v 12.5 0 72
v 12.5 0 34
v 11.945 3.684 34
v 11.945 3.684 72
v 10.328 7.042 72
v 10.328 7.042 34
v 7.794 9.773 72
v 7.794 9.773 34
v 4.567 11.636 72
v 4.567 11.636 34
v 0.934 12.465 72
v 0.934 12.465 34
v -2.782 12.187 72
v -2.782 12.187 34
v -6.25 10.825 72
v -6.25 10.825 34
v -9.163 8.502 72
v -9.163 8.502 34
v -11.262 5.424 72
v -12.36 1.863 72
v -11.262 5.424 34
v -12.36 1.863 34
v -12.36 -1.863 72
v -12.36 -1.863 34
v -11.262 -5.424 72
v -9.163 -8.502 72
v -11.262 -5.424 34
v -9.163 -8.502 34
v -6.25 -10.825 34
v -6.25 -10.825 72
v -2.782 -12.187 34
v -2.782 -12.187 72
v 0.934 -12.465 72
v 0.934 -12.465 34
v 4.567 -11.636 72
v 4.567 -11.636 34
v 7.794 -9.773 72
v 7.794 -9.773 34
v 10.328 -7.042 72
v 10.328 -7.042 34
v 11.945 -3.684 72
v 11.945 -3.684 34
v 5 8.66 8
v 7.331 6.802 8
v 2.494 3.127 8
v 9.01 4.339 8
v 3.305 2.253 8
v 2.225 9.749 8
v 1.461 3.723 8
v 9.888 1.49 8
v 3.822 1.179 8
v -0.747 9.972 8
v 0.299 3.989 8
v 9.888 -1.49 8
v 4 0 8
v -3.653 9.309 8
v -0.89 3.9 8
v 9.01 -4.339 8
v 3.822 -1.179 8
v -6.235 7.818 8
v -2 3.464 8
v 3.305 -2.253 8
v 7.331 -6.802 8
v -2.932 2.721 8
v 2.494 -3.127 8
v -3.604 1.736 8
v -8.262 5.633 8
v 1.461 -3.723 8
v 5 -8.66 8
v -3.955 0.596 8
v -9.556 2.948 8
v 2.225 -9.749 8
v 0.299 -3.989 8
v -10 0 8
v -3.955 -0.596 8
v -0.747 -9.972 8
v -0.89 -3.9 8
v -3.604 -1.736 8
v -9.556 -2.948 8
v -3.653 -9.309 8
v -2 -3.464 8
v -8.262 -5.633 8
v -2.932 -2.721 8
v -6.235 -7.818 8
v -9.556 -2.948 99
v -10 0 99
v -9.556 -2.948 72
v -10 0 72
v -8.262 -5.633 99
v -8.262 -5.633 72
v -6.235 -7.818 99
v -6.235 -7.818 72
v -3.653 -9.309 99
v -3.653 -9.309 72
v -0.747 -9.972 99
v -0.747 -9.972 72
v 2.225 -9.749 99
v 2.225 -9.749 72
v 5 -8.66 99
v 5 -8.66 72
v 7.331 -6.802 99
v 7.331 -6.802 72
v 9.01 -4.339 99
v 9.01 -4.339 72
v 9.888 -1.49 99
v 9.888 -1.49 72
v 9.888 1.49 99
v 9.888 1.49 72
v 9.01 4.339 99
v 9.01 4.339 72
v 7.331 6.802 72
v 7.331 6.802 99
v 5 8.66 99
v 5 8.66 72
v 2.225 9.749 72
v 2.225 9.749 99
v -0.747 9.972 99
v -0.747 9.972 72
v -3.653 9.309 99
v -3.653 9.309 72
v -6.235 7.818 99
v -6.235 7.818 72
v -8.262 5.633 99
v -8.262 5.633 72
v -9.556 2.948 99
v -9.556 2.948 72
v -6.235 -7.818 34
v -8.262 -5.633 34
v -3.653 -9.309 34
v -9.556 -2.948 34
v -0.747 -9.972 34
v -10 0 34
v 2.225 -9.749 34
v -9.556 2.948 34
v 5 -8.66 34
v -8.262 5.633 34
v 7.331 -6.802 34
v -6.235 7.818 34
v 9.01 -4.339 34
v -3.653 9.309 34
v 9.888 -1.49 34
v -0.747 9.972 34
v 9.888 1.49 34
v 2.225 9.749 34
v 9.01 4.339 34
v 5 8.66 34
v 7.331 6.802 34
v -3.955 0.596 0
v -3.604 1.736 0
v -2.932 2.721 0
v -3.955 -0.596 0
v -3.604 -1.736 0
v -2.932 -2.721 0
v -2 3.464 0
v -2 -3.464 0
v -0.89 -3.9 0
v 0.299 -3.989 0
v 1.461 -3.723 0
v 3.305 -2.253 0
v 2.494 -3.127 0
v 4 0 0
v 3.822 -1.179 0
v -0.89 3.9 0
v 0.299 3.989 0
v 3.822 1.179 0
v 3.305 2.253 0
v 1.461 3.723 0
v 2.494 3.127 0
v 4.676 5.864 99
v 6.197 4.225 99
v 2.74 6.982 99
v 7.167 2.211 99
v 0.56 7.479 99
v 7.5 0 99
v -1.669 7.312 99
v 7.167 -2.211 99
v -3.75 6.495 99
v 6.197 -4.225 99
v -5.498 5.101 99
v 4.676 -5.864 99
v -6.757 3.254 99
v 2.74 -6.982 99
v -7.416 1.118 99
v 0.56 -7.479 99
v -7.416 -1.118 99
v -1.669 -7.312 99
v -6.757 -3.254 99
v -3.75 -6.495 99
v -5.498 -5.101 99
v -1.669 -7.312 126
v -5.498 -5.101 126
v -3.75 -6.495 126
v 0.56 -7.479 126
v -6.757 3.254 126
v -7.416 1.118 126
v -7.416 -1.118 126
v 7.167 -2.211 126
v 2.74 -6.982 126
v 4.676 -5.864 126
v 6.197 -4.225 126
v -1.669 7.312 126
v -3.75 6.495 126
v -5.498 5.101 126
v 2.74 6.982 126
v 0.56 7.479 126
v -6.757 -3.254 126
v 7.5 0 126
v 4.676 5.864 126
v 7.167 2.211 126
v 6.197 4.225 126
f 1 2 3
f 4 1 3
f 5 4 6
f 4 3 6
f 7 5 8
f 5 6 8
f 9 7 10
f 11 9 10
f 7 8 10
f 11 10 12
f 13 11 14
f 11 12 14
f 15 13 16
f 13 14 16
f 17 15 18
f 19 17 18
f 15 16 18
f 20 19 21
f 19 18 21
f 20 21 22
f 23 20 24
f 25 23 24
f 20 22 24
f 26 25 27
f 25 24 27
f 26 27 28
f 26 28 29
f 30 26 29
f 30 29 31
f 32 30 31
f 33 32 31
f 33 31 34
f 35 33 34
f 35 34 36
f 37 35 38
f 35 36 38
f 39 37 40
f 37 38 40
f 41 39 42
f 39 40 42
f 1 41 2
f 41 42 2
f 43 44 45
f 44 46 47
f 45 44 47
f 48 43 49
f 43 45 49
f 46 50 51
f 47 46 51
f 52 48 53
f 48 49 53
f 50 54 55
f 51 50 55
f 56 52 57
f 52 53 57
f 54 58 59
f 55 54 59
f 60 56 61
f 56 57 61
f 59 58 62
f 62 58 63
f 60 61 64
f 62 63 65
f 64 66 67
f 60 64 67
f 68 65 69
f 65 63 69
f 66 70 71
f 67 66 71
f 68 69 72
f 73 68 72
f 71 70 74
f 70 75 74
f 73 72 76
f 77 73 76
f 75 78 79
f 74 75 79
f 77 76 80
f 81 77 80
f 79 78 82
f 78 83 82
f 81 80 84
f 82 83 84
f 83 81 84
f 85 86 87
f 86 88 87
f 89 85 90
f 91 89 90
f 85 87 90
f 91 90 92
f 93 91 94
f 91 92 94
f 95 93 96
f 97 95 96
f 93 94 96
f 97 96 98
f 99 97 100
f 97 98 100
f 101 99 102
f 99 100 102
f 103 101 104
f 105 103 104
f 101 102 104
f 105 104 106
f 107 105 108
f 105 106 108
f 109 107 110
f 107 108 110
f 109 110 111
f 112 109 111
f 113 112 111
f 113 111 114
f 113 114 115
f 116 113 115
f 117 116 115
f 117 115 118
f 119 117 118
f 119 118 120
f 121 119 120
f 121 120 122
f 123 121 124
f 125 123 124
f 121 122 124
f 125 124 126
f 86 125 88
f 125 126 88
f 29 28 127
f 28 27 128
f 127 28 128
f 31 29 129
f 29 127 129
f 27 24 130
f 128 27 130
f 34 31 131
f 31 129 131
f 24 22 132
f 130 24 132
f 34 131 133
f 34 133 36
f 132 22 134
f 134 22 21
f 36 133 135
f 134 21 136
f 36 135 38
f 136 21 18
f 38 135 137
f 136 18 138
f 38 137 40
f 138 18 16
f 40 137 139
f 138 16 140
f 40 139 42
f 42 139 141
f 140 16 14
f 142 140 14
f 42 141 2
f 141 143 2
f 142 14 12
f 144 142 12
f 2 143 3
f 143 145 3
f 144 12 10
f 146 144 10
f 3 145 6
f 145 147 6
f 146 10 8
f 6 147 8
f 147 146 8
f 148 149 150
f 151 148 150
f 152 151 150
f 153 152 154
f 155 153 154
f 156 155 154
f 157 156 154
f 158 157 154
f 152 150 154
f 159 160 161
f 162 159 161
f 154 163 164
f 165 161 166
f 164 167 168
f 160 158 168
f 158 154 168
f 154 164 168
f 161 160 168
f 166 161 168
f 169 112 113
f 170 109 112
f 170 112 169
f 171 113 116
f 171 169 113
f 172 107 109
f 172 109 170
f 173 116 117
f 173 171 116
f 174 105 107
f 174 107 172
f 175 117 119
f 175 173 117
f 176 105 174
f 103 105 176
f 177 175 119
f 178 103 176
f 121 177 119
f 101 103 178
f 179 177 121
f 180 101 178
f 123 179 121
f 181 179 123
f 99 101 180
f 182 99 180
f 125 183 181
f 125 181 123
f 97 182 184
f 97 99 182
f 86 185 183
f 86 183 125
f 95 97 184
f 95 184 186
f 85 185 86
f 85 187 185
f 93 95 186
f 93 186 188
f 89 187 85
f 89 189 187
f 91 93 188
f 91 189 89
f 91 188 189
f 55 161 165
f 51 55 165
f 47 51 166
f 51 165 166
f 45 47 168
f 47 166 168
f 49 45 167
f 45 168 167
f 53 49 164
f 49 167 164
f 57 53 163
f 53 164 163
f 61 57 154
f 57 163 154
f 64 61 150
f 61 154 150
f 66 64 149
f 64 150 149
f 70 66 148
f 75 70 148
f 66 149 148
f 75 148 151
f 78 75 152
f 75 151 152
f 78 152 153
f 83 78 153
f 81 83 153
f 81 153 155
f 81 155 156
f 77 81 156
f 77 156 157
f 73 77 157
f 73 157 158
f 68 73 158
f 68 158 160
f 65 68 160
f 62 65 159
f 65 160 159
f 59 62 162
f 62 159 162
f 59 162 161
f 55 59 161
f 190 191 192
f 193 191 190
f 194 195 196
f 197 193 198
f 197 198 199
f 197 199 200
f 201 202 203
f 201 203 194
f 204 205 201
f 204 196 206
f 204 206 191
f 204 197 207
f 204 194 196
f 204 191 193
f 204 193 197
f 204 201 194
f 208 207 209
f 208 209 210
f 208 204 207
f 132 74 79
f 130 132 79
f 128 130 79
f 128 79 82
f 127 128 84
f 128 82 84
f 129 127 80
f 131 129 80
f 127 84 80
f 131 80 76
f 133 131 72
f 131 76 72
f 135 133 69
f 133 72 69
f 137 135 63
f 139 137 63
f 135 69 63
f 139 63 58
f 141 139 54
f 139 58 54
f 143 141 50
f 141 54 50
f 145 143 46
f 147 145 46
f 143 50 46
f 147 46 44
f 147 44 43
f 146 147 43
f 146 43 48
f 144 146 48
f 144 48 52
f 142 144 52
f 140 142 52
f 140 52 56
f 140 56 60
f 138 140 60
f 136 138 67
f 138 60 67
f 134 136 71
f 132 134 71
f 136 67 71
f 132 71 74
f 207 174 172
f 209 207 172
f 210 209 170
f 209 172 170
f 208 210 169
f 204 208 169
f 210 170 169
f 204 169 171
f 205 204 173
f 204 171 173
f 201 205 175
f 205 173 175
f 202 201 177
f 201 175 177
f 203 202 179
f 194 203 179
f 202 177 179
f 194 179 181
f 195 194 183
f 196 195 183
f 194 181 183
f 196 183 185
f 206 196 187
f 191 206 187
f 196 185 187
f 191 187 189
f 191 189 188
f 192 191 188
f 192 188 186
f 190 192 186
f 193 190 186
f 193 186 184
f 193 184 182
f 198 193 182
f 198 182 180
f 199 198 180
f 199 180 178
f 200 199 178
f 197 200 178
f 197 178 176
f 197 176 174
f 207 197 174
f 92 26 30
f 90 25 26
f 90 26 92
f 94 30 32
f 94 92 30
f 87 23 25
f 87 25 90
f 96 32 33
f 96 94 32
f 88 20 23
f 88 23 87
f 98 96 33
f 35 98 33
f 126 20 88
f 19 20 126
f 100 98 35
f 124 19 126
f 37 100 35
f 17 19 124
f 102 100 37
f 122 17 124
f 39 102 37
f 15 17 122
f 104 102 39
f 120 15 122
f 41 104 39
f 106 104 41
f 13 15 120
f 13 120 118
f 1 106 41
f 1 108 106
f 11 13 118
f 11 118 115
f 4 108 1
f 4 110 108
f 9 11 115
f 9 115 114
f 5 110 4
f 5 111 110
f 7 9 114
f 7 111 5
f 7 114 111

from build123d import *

# Parameters (mm, degrees)
SKETCH1_R           = 4
BOSS_EXTRUDE1_DEPTH = 8
SKETCH2_R           = 10
BOSS_EXTRUDE2_DEPTH = 26
SKETCH3_R           = 12.5
BOSS_EXTRUDE3_DEPTH = 38
SKETCH4_R           = 10
BOSS_EXTRUDE4_DEPTH = 20
SKETCH5_R           = 7.5
BOSS_EXTRUDE5_DEPTH = 34
SKETCH8_R           = 10
SKETCH8_R_2         = 7.5
BOSS_EXTRUDE6_DEPTH = 7


with BuildPart() as part:
    # Sketch1 → Boss-Extrude1 (new body)
    with BuildSketch(Plane.XY):
        Circle(SKETCH1_R)
    extrude(amount=BOSS_EXTRUDE1_DEPTH)

    # Sketch2 → Boss-Extrude2 (add)
    with BuildSketch(Plane.XY.offset(8)):
        with Locations(Location((0, 0, 0), (0, 0, 180))):
            Circle(SKETCH2_R)
    extrude(amount=BOSS_EXTRUDE2_DEPTH)

    # Sketch3 → Boss-Extrude3 (add)
    with BuildSketch(Plane.XY.offset(34)):
        Circle(SKETCH3_R)
    extrude(amount=BOSS_EXTRUDE3_DEPTH)

    # Sketch4 → Boss-Extrude4 (add)
    with BuildSketch(Plane.XY.offset(72)):
        with Locations(Location((0, 0, 0), (0, 0, 180))):
            Circle(SKETCH4_R)
    extrude(amount=BOSS_EXTRUDE4_DEPTH)

    # Sketch5 → Boss-Extrude5 (add)
    with BuildSketch(Plane.XY.offset(92)):
        Circle(SKETCH5_R)
    extrude(amount=BOSS_EXTRUDE5_DEPTH)

    # Sketch8 → Boss-Extrude6 (add)
    with BuildSketch(Plane.XY.offset(92)):
        with Locations(Location((0, 0, 0), (0, 0, 180))):
            Circle(SKETCH8_R)
        Circle(SKETCH8_R_2, mode=Mode.SUBTRACT)
    extrude(amount=BOSS_EXTRUDE6_DEPTH)


solid = part.part
